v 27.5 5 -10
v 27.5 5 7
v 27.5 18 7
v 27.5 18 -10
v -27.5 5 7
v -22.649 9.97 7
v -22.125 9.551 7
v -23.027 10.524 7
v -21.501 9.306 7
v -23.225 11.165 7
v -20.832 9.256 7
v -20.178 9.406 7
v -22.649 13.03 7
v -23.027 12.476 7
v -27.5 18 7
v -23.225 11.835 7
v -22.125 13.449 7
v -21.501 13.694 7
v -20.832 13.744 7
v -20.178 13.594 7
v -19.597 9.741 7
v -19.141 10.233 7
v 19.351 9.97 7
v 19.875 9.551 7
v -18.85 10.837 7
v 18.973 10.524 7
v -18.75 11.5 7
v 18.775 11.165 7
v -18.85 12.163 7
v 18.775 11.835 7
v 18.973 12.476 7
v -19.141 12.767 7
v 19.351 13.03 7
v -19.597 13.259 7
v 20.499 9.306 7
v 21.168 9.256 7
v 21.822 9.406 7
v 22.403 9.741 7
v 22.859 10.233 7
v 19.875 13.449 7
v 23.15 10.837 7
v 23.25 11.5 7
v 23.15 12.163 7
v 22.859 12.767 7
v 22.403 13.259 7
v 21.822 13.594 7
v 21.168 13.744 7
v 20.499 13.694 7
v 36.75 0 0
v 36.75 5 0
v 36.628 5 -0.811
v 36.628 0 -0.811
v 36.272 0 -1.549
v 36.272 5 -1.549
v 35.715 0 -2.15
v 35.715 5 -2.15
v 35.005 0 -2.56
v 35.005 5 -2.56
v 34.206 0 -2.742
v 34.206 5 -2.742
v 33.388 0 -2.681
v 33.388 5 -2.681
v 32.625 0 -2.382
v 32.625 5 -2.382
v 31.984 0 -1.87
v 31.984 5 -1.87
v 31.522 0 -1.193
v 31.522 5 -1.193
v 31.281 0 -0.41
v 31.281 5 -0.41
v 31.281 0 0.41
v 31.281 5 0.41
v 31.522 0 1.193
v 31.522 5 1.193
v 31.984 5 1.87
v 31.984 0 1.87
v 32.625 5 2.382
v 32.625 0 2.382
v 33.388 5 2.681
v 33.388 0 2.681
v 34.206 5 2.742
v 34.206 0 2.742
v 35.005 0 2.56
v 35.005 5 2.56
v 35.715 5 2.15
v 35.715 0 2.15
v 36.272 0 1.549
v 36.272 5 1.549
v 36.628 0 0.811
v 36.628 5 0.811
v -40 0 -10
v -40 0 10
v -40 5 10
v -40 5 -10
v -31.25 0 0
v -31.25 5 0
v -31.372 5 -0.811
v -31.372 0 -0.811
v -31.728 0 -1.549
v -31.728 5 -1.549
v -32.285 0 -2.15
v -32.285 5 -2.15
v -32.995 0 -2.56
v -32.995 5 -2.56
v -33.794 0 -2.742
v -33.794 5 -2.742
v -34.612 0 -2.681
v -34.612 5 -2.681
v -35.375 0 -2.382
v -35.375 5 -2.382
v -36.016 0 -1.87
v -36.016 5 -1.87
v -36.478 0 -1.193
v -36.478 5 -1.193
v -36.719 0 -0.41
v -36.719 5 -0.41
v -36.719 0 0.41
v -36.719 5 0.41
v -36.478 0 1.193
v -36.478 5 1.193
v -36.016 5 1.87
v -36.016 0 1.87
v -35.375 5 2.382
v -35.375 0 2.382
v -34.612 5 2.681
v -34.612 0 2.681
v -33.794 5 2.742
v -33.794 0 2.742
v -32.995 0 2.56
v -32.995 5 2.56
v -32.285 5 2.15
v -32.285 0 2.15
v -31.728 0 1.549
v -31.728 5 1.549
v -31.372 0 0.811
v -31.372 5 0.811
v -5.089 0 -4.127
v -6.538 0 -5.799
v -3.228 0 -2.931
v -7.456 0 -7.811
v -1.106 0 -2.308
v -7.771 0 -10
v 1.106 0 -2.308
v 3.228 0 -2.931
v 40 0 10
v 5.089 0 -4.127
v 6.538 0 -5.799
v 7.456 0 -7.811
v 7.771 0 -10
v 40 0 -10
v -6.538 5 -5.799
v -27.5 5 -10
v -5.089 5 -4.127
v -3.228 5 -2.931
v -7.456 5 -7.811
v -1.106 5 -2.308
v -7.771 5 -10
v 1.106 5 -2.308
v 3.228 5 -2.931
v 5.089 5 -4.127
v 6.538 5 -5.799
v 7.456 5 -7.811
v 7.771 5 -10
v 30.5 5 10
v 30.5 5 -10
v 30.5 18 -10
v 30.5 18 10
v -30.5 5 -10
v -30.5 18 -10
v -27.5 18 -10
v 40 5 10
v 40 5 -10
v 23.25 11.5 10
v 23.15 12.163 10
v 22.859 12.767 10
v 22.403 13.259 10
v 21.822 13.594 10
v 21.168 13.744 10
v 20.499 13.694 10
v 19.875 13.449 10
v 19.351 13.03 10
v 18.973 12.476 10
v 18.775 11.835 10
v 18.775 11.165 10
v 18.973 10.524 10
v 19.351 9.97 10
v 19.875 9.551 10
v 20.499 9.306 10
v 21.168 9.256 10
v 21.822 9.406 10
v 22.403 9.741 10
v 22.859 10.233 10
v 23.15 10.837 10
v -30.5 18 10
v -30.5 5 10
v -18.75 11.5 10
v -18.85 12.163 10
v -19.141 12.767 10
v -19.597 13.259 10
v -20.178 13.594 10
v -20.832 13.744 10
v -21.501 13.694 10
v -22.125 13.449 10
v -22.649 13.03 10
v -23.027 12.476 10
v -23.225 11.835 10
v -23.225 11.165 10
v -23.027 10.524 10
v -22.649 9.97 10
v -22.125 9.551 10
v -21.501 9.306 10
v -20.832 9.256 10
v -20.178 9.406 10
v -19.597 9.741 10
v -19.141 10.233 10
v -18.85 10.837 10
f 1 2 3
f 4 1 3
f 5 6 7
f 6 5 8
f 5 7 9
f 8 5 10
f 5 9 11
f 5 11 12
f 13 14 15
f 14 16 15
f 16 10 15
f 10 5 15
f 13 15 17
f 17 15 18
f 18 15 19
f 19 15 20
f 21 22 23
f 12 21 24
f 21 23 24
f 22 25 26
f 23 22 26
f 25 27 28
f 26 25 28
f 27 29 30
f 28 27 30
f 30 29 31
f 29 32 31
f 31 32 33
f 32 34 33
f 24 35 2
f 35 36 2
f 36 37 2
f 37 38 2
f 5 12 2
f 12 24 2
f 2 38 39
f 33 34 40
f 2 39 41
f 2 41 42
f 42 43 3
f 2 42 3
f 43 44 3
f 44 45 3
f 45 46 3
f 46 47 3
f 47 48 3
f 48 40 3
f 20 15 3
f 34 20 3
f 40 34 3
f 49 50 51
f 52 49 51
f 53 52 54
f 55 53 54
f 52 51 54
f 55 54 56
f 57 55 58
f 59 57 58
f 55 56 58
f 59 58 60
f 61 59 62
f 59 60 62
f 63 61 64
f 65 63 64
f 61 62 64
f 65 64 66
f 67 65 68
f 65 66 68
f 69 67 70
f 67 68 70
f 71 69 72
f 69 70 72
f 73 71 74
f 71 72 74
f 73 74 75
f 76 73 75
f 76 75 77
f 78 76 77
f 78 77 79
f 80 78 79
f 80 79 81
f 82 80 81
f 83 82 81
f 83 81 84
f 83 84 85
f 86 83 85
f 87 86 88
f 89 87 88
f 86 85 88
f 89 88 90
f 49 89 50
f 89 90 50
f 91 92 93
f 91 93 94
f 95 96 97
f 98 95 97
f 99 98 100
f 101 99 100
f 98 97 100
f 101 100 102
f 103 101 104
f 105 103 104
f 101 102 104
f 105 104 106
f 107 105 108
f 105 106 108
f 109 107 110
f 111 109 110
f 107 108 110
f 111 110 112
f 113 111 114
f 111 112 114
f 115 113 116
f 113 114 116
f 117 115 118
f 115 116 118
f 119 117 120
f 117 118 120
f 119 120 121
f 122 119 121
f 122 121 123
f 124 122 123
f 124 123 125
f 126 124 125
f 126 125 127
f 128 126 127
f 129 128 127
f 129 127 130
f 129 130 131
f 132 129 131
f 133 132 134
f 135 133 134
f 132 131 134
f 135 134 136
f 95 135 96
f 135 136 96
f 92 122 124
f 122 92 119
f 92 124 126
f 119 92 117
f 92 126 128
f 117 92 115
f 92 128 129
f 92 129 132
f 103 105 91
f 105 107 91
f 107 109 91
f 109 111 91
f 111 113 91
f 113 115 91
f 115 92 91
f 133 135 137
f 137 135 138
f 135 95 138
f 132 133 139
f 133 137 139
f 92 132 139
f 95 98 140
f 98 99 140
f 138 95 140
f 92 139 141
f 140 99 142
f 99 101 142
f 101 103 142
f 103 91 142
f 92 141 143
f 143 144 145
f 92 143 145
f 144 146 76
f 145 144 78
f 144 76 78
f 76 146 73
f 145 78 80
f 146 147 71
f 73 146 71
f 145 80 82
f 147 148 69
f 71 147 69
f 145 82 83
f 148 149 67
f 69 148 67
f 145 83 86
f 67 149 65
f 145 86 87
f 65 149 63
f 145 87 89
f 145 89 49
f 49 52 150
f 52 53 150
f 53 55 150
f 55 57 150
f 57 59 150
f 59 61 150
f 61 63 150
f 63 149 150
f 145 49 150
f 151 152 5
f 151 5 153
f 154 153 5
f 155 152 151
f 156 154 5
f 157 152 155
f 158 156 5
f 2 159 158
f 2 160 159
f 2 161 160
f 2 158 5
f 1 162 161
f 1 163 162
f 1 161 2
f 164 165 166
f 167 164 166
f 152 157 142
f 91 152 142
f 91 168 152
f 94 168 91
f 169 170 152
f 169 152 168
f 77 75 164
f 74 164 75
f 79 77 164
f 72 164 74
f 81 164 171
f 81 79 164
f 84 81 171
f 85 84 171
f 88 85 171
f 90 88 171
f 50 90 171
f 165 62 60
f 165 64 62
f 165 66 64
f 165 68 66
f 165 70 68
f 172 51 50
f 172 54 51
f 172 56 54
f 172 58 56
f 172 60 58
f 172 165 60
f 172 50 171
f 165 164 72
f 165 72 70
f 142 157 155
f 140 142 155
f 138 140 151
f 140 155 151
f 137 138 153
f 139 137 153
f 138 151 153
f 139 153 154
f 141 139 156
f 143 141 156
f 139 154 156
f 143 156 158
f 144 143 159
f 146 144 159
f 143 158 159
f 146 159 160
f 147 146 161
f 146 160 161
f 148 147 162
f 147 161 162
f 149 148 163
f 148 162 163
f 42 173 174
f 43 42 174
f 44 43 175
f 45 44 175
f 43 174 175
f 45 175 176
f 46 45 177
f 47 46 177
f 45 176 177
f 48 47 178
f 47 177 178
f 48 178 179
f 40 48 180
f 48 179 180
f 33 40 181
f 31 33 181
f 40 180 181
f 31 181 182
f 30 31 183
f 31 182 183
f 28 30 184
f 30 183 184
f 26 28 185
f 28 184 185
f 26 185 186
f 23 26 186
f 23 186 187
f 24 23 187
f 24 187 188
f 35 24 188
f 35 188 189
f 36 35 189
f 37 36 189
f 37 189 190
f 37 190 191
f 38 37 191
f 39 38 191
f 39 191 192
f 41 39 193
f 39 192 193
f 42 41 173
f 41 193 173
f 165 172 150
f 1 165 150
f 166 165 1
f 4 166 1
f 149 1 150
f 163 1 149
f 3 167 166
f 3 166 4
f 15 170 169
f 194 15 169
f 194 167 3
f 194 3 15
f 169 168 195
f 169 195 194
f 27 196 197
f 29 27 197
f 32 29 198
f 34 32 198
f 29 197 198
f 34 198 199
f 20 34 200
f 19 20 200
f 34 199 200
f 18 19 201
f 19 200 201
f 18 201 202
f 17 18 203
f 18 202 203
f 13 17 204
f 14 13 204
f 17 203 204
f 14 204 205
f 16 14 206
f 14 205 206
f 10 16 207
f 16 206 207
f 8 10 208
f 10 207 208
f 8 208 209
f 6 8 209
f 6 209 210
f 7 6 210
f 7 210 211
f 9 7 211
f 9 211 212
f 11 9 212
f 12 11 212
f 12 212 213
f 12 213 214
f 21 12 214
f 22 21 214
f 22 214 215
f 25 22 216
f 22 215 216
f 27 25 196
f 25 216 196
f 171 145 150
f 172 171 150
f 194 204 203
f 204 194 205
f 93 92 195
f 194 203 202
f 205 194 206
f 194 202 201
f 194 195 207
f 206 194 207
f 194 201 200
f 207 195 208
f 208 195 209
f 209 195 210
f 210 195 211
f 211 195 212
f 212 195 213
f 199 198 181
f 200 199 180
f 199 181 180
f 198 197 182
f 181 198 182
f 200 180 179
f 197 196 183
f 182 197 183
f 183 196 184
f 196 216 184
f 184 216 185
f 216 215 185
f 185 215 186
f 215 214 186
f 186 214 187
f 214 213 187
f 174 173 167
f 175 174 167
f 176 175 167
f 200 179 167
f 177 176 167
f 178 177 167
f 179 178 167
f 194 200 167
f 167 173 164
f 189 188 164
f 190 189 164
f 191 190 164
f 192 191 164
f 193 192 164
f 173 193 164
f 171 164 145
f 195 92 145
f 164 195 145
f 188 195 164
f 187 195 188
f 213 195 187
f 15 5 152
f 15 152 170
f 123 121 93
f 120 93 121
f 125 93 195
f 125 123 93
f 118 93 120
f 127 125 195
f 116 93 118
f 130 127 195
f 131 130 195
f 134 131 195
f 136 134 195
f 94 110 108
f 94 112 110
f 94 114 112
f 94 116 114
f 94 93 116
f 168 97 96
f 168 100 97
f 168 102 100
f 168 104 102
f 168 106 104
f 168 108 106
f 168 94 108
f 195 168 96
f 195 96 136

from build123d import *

# Parameters (mm, degrees)
SKETCH1_W           = 80
SKETCH1_H           = 20
BOSS_EXTRUDE1_DEPTH = 5
SKETCH2_R           = 2.75
CUT_EXTRUDE1_DEPTH  = 5
SKETCH3_W           = 61
SKETCH3_H           = 13
SKETCH3_R           = 2.25
BOSS_EXTRUDE2_DEPTH = 3
SKETCH4_W           = 3
SKETCH4_H           = 13
BOSS_EXTRUDE3_DEPTH = 17
SKETCH5_R           = 7.771284408
CUT_EXTRUDE2_DEPTH  = 17


with BuildPart() as part:
    # Sketch1 → Boss-Extrude1 (new body)
    with BuildSketch(Plane(origin=(0, 0, 0), x_dir=(1, 0, 0), z_dir=(0, 1, 0))):
        Rectangle(SKETCH1_W, SKETCH1_H)
    extrude(amount=BOSS_EXTRUDE1_DEPTH)

    # Sketch2 → Cut-Extrude1 (cut)
    with BuildSketch(Plane(origin=(0, 5, 0), x_dir=(1, 0, 0), z_dir=(0, 1, 0))):
        with Locations((-34, 0)):
            Circle(SKETCH2_R)
        with Locations((34, 0)):
            Circle(SKETCH2_R)
    extrude(amount=-CUT_EXTRUDE1_DEPTH, mode=Mode.SUBTRACT)

    # Sketch3 → Boss-Extrude2 (add)
    with BuildSketch(Plane.XY.offset(10)):
        with Locations((0, 11.5)):
            Rectangle(SKETCH3_W, SKETCH3_H)
        with Locations((-21, 11.5)):
            Circle(SKETCH3_R, mode=Mode.SUBTRACT)
        with Locations((21, 11.5)):
            Circle(SKETCH3_R, mode=Mode.SUBTRACT)
    extrude(amount=-BOSS_EXTRUDE2_DEPTH)

    # Sketch4 → Boss-Extrude3 (add)
    with BuildSketch(Plane(origin=(0, 0, 7), x_dir=(-1, 0, 0), z_dir=(0, 0, -1))):
        with Locations((-29, 11.5)):
            Rectangle(SKETCH4_W, SKETCH4_H)
        with Locations((29, 11.5)):
            Rectangle(SKETCH4_W, SKETCH4_H)
    extrude(amount=BOSS_EXTRUDE3_DEPTH)

    # Sketch5 → Cut-Extrude2 (cut)
    with BuildSketch(Plane(origin=(0, 5, 0), x_dir=(1, 0, 0), z_dir=(0, 1, 0))):
        with Locations((0, 10)):
            Circle(SKETCH5_R)
    extrude(amount=-CUT_EXTRUDE2_DEPTH, mode=Mode.SUBTRACT)


solid = part.part
